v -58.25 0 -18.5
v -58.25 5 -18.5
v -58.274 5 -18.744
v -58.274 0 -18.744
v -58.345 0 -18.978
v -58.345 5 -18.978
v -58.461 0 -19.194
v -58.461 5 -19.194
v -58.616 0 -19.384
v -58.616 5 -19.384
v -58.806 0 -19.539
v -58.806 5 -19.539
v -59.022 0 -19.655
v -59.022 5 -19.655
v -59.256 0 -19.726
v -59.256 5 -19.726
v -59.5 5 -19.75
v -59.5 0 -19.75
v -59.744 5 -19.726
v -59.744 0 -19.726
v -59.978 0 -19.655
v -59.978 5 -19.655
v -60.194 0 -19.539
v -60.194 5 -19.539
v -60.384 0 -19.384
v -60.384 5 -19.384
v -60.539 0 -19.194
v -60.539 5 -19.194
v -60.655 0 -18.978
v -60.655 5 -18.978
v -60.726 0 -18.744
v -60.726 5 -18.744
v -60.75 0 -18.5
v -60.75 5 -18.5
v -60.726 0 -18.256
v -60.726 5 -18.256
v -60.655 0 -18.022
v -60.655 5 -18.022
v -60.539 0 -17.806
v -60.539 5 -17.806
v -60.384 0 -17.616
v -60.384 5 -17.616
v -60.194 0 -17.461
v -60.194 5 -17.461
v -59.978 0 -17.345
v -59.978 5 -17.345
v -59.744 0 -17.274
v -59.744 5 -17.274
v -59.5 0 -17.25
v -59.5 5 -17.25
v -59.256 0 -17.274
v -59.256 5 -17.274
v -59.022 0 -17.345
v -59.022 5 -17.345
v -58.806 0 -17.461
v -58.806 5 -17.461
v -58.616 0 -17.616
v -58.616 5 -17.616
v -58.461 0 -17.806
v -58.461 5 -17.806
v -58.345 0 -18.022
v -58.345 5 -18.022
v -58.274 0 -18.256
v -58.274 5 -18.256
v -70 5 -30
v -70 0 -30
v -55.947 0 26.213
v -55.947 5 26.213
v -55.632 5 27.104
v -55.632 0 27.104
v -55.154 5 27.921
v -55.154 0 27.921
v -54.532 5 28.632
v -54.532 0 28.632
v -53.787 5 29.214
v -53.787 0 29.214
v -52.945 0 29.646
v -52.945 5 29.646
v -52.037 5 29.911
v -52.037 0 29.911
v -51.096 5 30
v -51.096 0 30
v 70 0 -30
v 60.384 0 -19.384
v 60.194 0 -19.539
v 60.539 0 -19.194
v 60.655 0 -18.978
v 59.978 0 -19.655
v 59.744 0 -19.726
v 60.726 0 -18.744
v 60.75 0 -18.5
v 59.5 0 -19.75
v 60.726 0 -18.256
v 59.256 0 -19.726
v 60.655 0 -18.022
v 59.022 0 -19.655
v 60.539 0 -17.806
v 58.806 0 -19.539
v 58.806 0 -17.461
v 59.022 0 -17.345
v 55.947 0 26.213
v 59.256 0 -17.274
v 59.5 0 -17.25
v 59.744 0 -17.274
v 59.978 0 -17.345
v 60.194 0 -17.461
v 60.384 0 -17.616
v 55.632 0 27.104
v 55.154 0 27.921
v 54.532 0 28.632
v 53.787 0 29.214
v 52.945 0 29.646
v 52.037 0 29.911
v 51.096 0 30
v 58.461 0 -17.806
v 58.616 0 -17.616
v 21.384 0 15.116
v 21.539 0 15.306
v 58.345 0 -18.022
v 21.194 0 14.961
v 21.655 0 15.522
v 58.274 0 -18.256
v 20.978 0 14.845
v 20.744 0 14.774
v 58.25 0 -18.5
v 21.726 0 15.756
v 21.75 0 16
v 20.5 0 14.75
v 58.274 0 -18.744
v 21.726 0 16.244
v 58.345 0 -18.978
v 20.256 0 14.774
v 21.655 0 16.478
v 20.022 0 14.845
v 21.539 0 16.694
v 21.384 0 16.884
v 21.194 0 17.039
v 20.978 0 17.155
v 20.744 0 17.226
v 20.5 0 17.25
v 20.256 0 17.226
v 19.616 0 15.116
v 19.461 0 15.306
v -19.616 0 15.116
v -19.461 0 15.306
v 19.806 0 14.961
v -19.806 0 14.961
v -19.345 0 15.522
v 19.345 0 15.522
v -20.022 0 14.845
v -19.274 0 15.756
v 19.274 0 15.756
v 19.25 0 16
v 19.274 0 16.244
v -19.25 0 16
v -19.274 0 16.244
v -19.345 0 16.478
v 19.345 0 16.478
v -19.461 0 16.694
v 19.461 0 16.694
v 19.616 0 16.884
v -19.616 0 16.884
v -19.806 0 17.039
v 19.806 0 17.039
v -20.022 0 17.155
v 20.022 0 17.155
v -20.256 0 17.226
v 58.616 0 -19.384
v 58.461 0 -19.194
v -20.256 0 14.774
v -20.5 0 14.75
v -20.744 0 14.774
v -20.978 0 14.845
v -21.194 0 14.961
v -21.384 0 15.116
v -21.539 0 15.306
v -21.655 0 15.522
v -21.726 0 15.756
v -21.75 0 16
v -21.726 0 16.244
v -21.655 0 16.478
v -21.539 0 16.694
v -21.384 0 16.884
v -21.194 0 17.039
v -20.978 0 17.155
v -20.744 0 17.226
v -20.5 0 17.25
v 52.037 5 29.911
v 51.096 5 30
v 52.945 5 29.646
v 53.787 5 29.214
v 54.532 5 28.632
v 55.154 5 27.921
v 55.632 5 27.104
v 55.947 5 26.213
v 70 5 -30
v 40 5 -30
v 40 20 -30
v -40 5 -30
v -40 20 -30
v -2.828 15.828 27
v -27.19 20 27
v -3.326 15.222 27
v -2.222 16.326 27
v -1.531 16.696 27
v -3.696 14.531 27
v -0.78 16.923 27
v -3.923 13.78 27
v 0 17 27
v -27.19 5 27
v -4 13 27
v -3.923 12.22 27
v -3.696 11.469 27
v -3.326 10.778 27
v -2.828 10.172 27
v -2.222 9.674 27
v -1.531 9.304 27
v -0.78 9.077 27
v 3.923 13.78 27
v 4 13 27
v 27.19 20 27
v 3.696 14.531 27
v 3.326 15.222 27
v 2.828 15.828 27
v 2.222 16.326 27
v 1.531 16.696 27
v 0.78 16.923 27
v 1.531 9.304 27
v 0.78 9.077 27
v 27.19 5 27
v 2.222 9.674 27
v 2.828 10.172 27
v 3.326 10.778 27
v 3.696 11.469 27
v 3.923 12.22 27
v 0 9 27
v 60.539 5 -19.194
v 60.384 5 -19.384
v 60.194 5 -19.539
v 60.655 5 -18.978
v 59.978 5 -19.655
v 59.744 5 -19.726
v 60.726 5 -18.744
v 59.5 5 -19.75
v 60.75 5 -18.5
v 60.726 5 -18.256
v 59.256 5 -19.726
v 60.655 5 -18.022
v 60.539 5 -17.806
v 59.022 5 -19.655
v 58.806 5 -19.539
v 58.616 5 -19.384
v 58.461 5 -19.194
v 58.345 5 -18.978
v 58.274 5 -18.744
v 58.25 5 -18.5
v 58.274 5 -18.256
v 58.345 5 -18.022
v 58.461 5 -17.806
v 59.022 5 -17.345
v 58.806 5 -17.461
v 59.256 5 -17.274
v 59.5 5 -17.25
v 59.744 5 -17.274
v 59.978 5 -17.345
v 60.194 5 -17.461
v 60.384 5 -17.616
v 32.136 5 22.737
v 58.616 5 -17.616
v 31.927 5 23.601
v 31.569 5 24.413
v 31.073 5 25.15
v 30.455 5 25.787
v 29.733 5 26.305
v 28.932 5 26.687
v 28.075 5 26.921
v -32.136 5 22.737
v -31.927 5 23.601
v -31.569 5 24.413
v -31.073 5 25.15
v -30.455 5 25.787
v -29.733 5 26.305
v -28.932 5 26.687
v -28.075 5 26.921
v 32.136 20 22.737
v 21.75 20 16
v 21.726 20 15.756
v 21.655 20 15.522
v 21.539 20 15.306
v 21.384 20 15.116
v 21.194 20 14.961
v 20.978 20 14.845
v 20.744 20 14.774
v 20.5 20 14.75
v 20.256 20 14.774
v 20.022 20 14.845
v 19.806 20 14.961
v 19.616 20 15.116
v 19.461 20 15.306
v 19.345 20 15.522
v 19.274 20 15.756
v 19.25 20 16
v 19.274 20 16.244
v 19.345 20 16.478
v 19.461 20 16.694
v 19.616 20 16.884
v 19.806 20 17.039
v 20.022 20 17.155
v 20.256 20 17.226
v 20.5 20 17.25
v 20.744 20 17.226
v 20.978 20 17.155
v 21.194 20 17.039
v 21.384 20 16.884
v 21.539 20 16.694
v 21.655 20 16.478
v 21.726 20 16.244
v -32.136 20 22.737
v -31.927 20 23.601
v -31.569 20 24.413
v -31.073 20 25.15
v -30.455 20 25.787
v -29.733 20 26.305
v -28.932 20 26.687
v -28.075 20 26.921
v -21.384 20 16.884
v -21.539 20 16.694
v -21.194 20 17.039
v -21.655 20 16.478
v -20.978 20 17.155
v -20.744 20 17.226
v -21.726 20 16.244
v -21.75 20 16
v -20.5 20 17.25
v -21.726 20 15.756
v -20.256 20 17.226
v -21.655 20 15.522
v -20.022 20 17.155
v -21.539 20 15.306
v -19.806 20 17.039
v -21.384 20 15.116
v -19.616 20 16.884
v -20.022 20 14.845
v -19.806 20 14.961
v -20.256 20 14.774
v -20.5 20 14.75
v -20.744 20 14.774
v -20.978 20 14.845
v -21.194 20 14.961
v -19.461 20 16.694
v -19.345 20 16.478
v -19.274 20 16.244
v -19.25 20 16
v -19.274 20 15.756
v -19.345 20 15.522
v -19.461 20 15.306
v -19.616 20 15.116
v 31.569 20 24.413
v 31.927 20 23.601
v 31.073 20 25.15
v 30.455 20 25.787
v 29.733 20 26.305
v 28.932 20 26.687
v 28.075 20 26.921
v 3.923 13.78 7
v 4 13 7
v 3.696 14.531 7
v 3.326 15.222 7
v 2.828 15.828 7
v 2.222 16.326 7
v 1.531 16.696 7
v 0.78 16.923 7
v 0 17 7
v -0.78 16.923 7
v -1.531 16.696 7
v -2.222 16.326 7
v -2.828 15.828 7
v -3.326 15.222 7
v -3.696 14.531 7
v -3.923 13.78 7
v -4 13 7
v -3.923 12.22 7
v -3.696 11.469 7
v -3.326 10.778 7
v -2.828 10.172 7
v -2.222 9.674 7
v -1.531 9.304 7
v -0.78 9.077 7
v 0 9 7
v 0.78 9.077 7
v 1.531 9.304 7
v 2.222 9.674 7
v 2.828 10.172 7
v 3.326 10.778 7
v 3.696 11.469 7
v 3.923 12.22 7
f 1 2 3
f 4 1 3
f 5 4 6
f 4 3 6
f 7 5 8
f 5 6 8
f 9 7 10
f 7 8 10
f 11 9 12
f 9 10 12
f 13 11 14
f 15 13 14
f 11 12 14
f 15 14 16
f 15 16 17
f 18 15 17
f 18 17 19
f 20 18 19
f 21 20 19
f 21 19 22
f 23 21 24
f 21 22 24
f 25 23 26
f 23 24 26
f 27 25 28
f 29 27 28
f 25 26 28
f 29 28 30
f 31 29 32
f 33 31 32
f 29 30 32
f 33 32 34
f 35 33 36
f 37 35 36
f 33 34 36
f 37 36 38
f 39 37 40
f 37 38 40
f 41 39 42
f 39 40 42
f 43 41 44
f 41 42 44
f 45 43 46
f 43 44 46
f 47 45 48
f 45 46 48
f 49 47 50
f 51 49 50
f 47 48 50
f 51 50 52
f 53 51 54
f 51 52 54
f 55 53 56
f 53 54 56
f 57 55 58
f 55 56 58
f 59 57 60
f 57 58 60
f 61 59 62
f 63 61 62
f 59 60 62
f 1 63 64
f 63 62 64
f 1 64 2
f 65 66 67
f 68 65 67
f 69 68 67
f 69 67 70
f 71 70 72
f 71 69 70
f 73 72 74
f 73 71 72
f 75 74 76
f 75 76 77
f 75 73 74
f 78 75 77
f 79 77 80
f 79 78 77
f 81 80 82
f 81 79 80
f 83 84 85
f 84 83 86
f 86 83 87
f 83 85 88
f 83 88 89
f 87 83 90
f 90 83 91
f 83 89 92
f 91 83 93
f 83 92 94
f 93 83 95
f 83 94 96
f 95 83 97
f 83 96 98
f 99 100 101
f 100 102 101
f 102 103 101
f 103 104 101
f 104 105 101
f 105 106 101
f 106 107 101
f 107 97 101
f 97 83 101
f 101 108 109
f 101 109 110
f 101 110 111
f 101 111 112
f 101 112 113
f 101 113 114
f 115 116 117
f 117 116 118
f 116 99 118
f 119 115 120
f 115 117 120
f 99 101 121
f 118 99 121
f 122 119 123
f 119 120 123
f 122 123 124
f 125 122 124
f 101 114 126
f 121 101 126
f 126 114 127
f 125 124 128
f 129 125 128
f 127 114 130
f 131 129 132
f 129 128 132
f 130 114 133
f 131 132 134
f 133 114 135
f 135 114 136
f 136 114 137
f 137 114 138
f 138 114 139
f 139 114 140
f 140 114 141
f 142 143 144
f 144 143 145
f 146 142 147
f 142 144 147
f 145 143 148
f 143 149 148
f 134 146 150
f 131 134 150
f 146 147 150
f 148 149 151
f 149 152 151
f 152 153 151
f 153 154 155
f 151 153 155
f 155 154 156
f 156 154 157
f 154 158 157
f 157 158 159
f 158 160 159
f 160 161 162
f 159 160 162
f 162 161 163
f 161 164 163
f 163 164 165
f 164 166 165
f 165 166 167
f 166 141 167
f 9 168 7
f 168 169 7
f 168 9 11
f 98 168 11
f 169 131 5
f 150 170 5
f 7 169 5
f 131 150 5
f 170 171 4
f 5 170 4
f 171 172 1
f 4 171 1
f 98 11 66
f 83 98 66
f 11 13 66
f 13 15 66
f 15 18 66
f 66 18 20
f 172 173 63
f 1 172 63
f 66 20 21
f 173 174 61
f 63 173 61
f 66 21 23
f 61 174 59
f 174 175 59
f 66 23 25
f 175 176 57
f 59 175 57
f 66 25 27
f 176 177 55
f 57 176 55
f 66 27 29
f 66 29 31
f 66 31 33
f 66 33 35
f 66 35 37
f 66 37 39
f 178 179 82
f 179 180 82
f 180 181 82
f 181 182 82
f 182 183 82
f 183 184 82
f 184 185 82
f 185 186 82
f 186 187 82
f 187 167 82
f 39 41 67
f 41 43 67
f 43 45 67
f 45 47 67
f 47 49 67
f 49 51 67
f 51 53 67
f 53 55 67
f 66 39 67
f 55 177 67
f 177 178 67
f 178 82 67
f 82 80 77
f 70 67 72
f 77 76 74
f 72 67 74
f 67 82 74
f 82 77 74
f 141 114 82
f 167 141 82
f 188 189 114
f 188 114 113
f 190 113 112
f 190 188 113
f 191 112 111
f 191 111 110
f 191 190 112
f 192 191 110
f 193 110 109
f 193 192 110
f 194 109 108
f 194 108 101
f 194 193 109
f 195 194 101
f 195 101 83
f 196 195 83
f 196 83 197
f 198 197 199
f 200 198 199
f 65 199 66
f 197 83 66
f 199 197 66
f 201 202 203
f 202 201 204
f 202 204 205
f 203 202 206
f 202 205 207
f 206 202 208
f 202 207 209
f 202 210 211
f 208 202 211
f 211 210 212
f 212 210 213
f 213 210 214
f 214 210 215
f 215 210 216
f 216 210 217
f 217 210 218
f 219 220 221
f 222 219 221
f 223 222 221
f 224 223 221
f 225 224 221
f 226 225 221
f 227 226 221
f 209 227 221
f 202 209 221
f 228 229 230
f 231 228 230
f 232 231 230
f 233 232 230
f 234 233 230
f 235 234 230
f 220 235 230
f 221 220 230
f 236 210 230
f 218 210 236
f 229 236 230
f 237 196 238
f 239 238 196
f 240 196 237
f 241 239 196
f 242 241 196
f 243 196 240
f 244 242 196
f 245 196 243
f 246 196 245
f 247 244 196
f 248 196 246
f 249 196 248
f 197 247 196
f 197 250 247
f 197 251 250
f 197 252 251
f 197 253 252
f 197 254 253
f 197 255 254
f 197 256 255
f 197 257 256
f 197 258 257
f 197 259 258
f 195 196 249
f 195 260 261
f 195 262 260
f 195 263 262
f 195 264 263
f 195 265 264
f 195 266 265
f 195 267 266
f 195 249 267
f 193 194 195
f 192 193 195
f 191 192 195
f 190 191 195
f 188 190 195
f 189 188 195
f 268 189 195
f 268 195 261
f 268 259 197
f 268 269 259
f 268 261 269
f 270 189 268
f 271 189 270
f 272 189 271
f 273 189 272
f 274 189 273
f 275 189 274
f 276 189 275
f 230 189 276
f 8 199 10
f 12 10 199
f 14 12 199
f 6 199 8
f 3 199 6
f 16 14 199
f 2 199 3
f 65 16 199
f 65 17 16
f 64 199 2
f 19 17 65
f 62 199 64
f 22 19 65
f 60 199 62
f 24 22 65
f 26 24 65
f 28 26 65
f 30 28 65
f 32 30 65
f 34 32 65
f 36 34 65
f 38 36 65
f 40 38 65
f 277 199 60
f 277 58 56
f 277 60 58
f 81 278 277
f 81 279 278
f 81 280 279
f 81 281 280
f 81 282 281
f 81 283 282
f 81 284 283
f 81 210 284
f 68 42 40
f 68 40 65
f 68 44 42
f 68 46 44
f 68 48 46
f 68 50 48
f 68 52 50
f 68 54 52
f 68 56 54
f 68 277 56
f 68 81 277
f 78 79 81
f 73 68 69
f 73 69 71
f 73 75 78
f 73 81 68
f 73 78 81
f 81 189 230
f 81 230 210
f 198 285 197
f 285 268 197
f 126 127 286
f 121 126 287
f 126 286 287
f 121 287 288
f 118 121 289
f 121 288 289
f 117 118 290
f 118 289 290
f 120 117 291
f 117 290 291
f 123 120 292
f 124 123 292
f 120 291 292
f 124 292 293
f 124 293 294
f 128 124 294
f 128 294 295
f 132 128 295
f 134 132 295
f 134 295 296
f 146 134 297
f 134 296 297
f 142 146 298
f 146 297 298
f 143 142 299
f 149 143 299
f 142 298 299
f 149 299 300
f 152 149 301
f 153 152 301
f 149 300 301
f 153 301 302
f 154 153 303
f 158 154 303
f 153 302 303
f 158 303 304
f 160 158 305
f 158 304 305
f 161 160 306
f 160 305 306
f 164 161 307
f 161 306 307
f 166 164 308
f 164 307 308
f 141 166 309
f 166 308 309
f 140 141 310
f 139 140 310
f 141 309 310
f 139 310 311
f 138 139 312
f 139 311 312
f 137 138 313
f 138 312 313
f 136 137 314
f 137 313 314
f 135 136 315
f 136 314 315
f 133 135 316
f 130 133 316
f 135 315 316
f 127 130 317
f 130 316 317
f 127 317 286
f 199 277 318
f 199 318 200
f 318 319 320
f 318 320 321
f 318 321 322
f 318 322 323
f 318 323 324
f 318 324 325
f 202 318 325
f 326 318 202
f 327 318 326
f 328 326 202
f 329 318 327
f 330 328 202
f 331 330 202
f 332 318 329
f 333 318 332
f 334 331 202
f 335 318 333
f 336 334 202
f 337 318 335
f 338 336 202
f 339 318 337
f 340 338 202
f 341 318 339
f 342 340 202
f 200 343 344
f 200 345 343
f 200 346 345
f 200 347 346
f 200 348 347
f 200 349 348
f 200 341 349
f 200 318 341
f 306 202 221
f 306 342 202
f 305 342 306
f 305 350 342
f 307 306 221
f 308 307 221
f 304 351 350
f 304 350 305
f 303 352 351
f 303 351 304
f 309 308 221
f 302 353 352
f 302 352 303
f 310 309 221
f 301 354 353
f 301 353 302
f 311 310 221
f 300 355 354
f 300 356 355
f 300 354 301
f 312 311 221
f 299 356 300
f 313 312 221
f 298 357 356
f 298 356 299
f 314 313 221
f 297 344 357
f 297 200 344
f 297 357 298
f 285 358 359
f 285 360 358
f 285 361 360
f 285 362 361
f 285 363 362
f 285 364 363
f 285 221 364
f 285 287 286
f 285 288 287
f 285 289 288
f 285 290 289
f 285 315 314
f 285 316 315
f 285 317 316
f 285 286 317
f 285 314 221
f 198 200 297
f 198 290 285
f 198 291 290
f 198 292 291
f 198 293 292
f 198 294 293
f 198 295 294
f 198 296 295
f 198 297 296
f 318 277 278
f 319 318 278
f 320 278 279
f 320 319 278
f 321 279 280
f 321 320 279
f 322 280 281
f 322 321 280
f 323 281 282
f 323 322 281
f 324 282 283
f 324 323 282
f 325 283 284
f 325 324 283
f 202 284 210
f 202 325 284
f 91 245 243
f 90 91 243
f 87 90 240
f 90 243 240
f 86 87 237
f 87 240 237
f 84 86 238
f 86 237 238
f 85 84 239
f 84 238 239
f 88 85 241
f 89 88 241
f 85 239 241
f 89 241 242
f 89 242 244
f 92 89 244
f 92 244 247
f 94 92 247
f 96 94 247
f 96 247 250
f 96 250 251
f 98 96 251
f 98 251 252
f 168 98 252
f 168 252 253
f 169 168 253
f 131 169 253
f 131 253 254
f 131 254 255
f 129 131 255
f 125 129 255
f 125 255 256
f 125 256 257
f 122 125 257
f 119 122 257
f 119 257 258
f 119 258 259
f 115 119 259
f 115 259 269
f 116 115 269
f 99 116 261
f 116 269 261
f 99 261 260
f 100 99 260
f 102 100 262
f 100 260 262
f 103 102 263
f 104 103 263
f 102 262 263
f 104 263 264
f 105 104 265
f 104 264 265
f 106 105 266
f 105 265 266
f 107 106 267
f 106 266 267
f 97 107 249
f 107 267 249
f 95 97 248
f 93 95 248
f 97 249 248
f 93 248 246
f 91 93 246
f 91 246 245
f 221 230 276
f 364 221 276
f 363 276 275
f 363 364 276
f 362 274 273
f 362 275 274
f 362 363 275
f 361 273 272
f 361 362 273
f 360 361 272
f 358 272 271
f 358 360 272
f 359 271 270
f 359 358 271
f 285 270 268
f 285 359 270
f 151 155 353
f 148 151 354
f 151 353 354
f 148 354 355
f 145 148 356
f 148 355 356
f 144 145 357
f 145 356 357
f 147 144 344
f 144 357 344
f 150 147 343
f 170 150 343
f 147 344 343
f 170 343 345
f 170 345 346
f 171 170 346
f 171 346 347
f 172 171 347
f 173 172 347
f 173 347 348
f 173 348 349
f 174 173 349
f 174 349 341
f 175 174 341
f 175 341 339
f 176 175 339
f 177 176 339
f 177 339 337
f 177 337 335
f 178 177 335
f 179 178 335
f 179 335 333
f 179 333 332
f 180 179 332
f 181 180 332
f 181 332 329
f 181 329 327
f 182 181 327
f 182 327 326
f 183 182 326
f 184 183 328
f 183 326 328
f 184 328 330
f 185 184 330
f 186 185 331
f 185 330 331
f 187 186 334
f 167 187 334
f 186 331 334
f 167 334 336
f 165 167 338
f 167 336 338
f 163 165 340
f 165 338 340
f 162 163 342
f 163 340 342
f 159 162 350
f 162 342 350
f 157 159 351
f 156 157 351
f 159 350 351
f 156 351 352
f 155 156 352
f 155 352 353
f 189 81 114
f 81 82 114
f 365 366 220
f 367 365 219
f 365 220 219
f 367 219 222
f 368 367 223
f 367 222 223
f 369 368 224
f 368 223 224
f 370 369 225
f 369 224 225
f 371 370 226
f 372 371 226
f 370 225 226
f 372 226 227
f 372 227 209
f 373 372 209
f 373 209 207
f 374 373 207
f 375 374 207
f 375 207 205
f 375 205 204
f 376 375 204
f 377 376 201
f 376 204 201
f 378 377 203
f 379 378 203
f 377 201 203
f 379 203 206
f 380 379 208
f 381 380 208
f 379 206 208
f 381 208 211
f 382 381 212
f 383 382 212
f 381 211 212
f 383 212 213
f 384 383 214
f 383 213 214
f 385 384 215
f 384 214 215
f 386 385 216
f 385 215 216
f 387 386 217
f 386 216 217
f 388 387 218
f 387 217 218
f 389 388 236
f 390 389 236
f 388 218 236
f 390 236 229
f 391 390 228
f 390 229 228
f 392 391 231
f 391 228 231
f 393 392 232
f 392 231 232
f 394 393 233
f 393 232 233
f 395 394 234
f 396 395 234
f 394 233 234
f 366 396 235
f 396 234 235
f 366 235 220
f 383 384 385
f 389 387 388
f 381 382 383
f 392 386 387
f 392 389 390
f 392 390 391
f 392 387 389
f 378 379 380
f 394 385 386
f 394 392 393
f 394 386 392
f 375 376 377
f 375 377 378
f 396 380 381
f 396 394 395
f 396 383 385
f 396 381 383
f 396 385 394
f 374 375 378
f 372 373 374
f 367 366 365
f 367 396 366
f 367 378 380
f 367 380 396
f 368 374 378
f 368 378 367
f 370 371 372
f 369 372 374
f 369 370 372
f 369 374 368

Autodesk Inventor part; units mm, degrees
ref_plane "YZ Plane" through (0, 0, 0) normal (1, 0, 0) x (0, 1, 0)
ref_plane "XZ Plane" through (0, 0, 0) normal (0, 1, 0) x (-1, 0, 0)
ref_plane "XY Plane" through (0, 0, 0) normal (0, 0, 1) x (1, 0, 0)
sketch "Esquisse1" plane through (0, 0, 0) normal (0, 1, 0) x (-1, 0, 0)
  line L0 (55, 30) -> (-55, 30)
  line L1 (-55, 30) -> (-70, -30)
  line L2 (-70, -30) -> (70, -30)
  line L3 (70, -30) -> (55, 30)
  point P0 (0, 0)
  dimension "d0" = 140
  dimension "d1" = 110
  dimension "d2" = 60
  dimension "d3" = 70
  dimension "d4" = 55
  dimension "d5" = 30
extrude "Extrusion1" add sketch "Esquisse1" along normal blind 5
sketch "Esquisse2" plane through (0, 5, 0) normal (0, 1, 0) x (1, 0, 0)
  line L0 (-31.5, -27) -> (31.5, -27)
  line L1 (31.5, -27) -> (40, 30)
  line L2 (70, 30) -> (-70, 30) projected
  line L3 (-31.5, -27) -> (-40, 30)
  line L4 (40, 30) -> (-40, 30)
  line L5 (-55, -30) -> (55, -30) projected
  point P0 (0, 0)
  dimension "d8" = 80
  dimension "d9" = 63
  dimension "d10" = 31.5
  dimension "d11" = 40
  dimension "d12" = 3
extrude "Extrusion2" add sketch "Esquisse2" along normal blind 15
sketch "Esquisse3" plane through (-31.5, 5, 27) normal (0, 0, 1) x (1, 0, 0)
  circle A0 centre (31.5, 8) radius 4
  line L0 (0, 0) -> (0, 15) projected
  line L1 (63, 0) -> (63, 15) projected
  line L2 (71.5, 15) -> (-8.5, 15) projected
  point P0 (31.5, -5)
  dimension "d15" = 31.5
  dimension "d16" = 63
  dimension "d17" = 7
  dimension "d18" = 8
extrude "Extrusion3" cut sketch "Esquisse3" against normal blind 20
fillet "Congé1" radius 5 4 edges at (31.5, 12.5, 27) (-31.5, 12.5, 27) (55, 2.5, 30) (-55, 2.5, 30)
sketch "Esquisse5" plane through (0, 20, 0) normal (0, 1, 0) x (1, 0, 0)
  circle A0 centre (-59.5, 18.5) radius 1.25
  circle A1 centre (59.5, 18.5) radius 1.25
  circle A2 centre (20.5, -16) radius 1.25
  circle A3 centre (-20.5, -16) radius 1.25
  line L0 (-40, 30) -> (-70, 30) projected
  line L1 (70, 30) -> (40, 30) projected
  point P0 (0, 0)
  dimension "d22" = 2.5
  dimension "d23" = 2.5
  dimension "d24" = 2.5
  dimension "d25" = 2.5
  dimension "d26" = 119
  dimension "d27" = 41
  dimension "d28" = 59.5
  dimension "d30" = 20.5
  dimension "d31" = 34.5
  dimension "d32" = 11.5
  dimension "d33" = 11.5
  dimension "d34" = 34.5
extrude "Extrusion4" cut sketch "Esquisse5" against normal through all
equation "\"d3\" = 0.5 * d0"
equation "\"d4\" = 0.5 * d1"
equation "\"d5\" = 0.5 * d2"
equation "\"d10\" = 0.5 * d9"
equation "\"d11\" = 0.5 * d8"
equation "\"d15\" = 0.5 * d16"
equation "\"d23\" = d22"
equation "\"d24\" = d22"
equation "\"d25\" = d22"
equation "\"d28\" = 0.5 * d26"
equation "\"d30\" = 0.5 * d27"
equation "\"d33\" = d32"
equation "\"d34\" = d31"
properties part number "Pont_arriere" material "Bois (Cerisier)"
